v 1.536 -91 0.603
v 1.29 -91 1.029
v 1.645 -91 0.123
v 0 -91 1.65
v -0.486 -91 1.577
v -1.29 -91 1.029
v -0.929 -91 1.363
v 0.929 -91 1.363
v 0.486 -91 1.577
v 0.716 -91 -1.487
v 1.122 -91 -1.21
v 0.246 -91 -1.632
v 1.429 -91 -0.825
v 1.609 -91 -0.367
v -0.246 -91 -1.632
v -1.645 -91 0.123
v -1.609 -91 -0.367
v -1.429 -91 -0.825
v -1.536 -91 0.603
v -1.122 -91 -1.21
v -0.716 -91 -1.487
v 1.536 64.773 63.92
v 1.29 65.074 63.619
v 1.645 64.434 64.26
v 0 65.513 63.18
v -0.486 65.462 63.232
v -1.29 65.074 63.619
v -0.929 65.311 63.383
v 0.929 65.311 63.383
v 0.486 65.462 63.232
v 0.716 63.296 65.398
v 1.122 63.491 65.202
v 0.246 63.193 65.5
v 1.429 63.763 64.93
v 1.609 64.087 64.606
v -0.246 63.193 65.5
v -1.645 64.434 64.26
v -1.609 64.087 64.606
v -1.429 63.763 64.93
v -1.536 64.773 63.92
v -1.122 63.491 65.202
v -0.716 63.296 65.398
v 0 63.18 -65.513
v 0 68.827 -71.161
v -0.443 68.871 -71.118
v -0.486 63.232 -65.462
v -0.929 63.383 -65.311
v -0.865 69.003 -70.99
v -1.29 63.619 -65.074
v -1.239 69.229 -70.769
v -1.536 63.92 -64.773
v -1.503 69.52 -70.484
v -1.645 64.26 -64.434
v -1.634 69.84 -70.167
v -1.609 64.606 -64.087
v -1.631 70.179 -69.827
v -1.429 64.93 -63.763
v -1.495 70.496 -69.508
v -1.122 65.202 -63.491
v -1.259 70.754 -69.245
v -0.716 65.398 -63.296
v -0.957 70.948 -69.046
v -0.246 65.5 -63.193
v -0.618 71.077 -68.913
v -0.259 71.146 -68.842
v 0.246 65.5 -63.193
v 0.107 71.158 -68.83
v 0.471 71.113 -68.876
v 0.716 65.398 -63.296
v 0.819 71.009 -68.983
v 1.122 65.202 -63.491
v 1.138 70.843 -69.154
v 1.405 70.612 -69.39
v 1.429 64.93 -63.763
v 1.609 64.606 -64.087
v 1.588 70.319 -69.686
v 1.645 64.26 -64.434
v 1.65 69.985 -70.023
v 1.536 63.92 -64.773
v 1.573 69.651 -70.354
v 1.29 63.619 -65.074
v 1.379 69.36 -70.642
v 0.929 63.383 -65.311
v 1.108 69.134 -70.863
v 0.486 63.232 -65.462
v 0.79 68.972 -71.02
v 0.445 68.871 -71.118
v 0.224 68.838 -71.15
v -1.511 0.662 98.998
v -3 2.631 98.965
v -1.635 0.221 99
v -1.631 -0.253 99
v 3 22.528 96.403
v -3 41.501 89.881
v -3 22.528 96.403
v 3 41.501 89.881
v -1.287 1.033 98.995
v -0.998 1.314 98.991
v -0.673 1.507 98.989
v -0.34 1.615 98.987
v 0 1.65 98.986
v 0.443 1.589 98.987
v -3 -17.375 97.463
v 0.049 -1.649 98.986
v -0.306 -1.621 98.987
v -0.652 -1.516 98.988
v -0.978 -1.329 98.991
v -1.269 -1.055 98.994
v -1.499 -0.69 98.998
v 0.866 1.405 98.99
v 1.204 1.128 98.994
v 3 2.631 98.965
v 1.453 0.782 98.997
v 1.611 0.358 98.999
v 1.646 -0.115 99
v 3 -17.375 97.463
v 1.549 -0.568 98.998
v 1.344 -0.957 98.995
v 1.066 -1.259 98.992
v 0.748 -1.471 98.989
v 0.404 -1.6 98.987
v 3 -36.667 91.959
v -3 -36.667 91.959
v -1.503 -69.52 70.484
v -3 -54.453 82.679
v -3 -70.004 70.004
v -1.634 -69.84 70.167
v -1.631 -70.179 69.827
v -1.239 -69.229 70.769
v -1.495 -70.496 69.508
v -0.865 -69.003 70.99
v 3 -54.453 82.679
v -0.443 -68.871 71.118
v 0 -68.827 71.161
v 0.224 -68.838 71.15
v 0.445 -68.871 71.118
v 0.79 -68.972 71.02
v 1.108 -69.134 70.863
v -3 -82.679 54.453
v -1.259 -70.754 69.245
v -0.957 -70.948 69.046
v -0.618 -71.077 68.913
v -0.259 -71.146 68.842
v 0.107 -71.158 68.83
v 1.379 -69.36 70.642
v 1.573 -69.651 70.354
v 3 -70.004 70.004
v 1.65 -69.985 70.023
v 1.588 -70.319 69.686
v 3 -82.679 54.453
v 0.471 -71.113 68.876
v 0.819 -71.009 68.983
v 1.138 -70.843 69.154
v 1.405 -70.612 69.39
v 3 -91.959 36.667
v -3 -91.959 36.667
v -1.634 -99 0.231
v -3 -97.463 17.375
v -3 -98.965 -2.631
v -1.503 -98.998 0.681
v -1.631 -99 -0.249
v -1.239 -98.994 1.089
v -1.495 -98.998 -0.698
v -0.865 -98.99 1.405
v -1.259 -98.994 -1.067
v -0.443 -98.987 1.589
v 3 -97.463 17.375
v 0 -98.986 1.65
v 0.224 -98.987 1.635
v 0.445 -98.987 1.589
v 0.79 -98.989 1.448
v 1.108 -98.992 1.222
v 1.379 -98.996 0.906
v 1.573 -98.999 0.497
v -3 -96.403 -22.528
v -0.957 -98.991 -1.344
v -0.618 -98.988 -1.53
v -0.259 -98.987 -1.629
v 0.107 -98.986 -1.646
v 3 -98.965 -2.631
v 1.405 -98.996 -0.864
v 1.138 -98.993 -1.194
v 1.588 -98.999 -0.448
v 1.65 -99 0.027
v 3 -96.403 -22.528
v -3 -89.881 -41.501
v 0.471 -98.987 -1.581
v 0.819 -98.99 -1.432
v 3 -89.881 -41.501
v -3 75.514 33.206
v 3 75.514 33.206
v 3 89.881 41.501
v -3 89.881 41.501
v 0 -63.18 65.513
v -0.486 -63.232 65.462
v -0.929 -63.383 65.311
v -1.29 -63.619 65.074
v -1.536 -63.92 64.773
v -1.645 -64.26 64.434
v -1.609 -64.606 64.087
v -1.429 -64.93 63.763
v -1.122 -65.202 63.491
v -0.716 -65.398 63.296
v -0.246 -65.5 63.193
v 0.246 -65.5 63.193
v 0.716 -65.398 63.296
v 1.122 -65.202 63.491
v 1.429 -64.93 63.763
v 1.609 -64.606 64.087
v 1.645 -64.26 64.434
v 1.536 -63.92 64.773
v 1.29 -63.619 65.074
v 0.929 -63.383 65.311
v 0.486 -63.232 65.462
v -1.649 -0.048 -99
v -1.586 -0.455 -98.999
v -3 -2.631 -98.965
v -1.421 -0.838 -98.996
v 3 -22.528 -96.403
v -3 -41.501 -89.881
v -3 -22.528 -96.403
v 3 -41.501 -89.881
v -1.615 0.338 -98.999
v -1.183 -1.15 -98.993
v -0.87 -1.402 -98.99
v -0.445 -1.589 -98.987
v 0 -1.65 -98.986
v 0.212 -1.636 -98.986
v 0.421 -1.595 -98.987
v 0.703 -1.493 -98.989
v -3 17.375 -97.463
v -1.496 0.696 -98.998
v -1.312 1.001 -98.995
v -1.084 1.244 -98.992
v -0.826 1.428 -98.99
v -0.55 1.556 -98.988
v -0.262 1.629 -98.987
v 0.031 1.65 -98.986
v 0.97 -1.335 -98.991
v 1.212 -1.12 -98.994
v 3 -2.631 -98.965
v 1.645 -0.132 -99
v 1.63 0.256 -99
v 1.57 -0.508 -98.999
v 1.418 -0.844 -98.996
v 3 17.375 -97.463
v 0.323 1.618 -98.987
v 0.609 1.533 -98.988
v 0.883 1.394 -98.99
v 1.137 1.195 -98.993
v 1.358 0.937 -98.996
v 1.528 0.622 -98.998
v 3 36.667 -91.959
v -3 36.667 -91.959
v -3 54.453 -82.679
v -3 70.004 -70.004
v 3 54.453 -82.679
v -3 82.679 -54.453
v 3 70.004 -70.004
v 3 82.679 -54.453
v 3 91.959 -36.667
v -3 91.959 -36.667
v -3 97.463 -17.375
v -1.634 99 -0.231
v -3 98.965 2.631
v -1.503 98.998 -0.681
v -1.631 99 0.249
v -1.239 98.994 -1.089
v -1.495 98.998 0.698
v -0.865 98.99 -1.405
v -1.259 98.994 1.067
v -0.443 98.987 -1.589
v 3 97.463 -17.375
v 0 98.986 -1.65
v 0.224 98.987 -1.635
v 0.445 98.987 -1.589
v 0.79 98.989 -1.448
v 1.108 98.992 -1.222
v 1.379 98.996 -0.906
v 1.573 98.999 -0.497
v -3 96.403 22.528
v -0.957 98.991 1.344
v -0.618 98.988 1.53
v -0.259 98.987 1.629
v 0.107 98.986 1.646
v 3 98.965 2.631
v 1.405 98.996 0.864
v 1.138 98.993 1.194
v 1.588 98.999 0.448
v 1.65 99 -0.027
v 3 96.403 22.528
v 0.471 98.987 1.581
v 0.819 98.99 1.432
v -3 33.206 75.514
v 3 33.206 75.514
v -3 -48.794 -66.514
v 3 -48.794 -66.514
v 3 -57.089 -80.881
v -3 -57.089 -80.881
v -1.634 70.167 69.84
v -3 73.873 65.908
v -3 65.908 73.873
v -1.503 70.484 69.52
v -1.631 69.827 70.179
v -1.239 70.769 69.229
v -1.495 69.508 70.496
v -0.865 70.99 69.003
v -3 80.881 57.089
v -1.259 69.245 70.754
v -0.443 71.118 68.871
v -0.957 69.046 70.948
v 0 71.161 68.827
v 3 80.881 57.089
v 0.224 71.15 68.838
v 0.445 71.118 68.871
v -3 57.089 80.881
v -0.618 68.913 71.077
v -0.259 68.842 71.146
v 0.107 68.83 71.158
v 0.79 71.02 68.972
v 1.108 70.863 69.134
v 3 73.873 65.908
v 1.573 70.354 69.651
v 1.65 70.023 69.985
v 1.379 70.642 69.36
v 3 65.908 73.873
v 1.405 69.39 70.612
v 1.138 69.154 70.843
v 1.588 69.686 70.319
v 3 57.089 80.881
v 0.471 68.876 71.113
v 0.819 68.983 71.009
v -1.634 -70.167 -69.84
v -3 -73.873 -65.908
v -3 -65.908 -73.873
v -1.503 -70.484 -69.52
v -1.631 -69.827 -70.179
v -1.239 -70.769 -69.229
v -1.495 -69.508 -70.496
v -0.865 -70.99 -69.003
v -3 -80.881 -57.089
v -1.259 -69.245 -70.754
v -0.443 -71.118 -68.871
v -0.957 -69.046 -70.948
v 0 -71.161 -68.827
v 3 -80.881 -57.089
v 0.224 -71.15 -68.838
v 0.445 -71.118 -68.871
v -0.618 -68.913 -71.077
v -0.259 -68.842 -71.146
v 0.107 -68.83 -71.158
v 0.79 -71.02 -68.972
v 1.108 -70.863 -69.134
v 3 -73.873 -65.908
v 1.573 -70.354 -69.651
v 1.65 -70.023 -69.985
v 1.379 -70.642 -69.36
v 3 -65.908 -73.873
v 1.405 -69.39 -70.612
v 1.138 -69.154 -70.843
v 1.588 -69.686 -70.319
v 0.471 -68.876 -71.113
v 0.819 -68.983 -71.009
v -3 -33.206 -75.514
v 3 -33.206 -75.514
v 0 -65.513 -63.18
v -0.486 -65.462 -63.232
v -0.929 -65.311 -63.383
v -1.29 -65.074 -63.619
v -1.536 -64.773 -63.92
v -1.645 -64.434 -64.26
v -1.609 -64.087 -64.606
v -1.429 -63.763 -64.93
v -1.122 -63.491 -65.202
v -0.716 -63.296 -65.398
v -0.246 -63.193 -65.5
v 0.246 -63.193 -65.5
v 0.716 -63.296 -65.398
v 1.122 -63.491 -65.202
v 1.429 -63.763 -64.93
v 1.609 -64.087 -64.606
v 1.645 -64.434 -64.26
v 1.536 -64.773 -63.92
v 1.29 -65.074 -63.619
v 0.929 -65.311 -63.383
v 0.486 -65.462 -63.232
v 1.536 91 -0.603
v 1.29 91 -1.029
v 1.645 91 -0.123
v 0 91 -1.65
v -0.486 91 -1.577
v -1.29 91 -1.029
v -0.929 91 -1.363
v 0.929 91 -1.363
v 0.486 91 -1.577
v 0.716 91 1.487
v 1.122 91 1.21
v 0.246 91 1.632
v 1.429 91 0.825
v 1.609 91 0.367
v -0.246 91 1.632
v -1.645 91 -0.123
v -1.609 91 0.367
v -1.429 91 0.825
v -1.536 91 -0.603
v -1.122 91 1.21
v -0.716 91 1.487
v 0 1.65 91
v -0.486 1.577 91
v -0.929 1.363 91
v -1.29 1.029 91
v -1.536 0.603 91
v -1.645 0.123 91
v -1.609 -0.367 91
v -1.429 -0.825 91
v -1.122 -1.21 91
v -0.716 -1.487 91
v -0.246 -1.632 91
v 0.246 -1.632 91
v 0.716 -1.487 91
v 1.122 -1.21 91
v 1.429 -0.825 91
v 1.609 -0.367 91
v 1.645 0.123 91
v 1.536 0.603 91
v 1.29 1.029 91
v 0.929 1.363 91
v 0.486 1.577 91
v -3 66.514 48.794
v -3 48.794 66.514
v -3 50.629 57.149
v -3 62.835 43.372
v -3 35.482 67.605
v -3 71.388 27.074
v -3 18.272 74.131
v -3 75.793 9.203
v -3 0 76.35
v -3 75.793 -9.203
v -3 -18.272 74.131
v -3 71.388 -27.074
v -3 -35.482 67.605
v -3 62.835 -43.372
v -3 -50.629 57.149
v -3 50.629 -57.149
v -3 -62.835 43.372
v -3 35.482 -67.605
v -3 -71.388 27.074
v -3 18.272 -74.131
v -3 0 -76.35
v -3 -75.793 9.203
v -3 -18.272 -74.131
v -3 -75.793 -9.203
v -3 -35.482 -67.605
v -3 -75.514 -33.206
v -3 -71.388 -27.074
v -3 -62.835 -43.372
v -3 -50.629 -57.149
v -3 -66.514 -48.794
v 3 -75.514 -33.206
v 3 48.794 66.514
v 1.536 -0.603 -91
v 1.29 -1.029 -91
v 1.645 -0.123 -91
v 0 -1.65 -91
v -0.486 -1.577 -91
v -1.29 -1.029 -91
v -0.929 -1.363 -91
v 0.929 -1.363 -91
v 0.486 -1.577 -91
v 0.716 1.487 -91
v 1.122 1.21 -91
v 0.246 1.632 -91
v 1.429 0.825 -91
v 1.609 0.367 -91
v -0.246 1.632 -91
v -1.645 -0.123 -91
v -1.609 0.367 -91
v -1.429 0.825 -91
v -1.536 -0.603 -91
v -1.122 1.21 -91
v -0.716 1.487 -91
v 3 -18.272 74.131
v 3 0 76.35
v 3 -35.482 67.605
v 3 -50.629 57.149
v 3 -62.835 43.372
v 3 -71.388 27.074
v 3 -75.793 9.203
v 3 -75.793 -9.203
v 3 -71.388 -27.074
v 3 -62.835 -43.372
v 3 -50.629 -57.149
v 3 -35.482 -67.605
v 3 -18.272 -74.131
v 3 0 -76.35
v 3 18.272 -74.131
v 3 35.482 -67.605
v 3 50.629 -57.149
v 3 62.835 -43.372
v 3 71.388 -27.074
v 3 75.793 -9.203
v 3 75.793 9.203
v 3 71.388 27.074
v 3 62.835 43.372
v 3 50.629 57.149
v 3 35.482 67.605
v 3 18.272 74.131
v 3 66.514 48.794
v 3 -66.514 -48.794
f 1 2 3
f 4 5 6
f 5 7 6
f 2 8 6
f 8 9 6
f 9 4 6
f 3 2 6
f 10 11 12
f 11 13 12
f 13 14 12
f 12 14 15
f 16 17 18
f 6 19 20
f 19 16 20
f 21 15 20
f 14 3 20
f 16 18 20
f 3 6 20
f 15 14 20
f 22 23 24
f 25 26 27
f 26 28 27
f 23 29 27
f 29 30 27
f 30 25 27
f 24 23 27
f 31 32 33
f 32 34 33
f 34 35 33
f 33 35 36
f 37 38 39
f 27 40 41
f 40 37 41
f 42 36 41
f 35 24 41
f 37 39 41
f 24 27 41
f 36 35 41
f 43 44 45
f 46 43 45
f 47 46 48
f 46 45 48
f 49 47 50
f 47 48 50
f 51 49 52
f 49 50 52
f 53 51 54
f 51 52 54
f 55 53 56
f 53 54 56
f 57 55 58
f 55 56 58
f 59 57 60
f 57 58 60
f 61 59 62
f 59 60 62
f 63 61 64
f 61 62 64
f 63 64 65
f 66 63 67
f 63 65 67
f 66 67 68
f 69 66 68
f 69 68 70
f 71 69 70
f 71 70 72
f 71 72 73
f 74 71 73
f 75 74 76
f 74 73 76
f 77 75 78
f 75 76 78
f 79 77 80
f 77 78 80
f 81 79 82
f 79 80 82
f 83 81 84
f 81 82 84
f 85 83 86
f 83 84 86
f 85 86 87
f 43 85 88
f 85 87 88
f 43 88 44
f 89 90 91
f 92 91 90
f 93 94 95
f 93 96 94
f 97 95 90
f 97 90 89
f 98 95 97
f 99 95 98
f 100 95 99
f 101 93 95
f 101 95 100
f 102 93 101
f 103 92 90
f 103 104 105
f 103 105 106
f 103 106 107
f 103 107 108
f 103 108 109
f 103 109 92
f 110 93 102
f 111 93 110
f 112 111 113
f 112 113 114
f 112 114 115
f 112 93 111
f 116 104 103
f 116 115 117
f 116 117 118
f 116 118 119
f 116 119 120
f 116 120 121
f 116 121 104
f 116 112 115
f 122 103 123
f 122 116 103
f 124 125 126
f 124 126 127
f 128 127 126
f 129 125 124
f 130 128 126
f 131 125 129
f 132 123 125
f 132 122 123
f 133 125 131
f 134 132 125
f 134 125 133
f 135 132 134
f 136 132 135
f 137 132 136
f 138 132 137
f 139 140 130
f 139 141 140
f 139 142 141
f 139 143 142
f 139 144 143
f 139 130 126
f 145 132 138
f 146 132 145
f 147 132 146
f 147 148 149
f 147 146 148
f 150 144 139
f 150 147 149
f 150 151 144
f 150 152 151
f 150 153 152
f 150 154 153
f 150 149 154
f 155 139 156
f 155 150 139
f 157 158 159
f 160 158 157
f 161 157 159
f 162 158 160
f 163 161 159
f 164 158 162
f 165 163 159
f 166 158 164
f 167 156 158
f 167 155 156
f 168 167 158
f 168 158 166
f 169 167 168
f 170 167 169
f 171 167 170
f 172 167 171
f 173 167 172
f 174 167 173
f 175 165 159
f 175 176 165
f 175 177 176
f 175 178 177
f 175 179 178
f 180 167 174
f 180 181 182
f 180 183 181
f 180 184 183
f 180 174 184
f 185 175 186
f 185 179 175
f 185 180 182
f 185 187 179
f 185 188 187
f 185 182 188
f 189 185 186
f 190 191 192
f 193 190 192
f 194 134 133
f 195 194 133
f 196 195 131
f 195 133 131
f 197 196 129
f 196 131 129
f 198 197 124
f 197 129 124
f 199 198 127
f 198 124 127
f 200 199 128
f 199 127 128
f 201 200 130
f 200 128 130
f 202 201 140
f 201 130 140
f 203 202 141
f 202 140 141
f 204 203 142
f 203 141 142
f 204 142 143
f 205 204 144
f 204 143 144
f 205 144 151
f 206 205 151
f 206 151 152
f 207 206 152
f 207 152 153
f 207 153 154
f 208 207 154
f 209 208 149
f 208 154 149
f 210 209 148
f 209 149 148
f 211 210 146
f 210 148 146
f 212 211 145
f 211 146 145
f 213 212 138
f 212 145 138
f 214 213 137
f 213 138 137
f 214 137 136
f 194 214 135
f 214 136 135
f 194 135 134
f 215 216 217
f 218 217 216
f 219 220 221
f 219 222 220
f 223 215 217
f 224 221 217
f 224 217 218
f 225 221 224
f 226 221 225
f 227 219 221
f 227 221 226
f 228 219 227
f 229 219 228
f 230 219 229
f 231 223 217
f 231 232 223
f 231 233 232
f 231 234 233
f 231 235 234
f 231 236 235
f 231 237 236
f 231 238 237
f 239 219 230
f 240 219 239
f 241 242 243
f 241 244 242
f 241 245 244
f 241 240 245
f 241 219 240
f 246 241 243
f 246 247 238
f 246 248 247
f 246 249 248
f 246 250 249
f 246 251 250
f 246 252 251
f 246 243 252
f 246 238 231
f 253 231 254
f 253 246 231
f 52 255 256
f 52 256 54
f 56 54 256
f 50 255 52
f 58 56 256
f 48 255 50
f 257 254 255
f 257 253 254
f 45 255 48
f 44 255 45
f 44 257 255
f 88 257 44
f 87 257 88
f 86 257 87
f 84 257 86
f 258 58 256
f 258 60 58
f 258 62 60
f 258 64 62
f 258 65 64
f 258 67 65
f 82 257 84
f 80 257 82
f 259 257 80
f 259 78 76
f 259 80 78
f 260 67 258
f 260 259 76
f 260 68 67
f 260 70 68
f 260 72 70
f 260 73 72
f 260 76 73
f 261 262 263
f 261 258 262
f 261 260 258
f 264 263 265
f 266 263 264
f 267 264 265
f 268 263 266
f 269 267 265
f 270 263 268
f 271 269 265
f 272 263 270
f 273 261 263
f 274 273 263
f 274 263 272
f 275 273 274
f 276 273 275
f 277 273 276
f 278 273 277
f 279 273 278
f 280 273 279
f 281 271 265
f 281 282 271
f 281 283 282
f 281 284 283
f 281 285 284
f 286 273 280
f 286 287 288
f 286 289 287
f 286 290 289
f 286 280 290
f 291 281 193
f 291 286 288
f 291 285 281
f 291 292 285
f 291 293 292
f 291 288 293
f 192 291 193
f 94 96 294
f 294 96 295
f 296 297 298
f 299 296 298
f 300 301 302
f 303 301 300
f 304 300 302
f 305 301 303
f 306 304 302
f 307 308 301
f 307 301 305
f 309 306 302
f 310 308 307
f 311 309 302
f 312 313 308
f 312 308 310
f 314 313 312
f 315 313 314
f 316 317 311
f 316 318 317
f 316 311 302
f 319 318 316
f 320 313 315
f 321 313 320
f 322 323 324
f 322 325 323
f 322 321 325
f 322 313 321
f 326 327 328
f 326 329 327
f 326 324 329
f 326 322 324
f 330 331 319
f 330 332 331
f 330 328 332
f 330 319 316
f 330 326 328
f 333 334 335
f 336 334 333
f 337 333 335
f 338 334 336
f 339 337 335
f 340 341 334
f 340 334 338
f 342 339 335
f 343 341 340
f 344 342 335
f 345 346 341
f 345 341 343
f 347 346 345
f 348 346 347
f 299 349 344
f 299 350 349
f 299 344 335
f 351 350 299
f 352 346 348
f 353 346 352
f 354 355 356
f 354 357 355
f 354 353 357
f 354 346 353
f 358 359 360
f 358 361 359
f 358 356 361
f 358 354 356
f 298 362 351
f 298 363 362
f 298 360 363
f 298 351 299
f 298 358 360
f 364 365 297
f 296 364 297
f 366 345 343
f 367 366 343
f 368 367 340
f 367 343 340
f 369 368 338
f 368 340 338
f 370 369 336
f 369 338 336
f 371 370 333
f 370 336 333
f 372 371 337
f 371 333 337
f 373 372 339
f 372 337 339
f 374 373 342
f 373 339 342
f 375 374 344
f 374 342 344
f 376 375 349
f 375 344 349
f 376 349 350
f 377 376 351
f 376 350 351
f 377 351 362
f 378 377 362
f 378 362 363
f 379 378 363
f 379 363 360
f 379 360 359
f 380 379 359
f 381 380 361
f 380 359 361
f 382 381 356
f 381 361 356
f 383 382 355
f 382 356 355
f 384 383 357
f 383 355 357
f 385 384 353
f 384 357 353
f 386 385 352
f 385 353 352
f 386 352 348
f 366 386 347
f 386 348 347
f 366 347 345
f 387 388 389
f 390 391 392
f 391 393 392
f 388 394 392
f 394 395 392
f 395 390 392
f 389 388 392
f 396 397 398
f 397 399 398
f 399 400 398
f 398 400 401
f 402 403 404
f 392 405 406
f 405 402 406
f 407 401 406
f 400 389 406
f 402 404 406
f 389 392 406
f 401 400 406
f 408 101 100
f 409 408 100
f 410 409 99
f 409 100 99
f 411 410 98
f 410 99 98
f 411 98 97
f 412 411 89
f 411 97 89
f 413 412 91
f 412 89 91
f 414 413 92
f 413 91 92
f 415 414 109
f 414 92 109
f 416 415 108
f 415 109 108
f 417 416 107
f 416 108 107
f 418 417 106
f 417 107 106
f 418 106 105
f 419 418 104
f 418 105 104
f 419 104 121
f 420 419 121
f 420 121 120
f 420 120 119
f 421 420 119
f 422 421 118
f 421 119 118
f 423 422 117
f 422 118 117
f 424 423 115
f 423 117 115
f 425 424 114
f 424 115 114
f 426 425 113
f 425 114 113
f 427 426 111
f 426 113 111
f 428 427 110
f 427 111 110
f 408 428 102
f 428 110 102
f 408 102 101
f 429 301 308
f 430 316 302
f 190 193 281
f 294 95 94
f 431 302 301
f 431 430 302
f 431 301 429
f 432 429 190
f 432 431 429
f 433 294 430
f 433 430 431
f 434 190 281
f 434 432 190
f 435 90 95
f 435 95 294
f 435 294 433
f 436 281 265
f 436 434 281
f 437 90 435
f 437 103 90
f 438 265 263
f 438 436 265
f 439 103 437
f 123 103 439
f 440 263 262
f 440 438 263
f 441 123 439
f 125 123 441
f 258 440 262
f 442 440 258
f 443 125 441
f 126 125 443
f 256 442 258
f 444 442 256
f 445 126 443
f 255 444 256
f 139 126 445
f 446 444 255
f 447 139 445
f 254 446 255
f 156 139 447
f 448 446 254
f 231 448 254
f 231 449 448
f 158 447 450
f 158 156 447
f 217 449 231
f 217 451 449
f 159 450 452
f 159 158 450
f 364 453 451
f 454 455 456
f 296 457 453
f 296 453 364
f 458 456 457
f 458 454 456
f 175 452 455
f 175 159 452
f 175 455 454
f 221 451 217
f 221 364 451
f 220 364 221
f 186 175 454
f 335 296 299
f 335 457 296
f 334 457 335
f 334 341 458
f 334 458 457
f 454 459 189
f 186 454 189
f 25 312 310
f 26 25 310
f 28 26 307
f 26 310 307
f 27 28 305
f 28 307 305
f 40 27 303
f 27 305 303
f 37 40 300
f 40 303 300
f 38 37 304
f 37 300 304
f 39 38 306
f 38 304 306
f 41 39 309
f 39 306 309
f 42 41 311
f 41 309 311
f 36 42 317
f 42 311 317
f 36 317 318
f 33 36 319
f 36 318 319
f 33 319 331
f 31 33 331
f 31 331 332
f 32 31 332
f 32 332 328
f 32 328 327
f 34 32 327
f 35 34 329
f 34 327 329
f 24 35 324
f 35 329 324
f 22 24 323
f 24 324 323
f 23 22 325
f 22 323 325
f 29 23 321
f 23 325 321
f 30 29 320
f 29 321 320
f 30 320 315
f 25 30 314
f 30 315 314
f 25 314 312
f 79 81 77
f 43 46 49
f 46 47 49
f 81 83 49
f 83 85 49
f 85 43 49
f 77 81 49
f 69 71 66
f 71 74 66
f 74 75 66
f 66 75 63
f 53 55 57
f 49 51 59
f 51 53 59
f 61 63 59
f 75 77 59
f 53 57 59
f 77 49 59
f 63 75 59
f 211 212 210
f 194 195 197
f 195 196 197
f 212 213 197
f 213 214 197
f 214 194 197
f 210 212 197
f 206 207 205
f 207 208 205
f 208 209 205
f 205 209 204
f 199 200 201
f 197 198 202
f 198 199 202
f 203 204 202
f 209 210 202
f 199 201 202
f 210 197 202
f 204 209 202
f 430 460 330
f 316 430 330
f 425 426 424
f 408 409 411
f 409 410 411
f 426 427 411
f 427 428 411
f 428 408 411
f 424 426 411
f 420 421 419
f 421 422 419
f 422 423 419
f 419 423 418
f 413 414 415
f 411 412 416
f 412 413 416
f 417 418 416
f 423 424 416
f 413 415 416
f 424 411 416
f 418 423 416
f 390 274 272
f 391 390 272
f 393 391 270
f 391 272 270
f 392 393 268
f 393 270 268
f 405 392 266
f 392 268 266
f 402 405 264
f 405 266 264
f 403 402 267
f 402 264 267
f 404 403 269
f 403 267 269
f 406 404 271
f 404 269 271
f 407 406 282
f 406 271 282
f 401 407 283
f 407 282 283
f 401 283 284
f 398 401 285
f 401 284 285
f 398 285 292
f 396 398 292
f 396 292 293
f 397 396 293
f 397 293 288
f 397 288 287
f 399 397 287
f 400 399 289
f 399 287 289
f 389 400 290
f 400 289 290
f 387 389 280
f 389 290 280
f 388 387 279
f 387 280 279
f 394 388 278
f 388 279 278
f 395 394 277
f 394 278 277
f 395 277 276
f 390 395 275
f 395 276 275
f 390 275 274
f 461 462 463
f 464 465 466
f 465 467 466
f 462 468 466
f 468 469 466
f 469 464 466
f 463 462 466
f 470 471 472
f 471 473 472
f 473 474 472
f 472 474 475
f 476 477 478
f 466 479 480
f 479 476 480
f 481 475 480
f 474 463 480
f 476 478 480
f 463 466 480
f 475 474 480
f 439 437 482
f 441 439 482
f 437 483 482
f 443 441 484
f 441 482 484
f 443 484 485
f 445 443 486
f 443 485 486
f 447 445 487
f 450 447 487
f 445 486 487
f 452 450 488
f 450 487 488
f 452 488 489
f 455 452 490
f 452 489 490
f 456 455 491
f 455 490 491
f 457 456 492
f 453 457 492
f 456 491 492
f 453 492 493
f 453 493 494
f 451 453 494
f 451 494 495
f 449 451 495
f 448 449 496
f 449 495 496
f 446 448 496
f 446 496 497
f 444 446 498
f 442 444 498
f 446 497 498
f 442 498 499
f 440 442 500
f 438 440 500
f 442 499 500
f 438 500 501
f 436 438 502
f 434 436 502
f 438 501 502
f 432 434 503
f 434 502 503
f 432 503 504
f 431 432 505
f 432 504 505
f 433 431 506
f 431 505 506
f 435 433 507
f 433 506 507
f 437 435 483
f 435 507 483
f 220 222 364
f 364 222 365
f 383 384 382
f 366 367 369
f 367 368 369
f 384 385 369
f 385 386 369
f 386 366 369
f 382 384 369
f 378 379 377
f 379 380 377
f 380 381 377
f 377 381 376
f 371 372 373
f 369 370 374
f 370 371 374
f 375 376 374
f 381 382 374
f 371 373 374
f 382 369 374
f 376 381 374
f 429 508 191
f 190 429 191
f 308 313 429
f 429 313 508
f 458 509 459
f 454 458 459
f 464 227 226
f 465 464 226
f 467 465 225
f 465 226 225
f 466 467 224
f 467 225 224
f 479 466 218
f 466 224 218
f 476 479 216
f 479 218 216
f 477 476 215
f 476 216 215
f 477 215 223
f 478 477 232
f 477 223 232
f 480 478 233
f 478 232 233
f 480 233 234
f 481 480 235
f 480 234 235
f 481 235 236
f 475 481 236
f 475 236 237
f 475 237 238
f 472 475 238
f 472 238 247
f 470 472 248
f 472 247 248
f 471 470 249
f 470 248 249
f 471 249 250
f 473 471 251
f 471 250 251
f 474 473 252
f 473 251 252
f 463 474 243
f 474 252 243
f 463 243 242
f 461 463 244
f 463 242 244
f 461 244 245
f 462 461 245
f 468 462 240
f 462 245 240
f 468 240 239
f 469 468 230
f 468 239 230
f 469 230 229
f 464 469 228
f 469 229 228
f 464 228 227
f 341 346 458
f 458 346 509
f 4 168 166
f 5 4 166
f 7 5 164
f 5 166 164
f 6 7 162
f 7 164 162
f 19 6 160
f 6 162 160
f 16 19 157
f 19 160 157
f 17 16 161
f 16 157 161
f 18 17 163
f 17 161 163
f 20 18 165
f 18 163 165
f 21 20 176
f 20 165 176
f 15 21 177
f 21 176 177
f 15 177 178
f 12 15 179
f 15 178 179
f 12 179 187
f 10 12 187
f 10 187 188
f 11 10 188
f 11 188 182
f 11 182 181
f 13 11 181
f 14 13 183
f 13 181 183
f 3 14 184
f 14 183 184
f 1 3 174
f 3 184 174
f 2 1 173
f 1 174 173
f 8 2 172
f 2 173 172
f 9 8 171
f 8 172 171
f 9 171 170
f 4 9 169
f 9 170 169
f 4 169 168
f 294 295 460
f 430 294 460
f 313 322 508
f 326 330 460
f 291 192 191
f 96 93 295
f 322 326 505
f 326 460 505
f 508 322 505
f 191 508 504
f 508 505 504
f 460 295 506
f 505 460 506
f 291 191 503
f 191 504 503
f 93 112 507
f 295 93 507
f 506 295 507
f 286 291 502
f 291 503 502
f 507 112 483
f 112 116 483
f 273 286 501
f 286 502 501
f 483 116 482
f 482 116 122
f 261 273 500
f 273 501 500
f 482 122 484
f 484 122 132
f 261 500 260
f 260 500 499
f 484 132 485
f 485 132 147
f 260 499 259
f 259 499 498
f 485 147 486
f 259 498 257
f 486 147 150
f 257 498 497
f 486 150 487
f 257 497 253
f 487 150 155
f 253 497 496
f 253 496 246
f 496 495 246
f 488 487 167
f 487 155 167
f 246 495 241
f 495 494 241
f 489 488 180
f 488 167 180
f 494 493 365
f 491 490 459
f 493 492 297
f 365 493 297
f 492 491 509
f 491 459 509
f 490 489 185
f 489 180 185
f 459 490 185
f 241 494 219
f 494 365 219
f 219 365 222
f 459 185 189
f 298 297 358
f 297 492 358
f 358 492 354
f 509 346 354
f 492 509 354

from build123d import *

# Parameters (mm, degrees)
RING_SKETCH_W        = 6
RING_SKETCH_H        = 22.65
NOTCH_30_DEPTH       = 6
NOTCH_60_DEPTH       = 6
NOTCH_210_DEPTH      = 6
NOTCH_240_DEPTH      = 6
SCREW_HOLE_SKETCH_W  = 1.65
SCREW_HOLE_SKETCH_H  = 9
SCREW_HOLES_X8_COUNT = 8


with BuildPart() as part:
    # Ring Sketch → Ring (revolve)
    with BuildSketch(Plane.XY):
        with Locations((0, 87.675)):
            Rectangle(RING_SKETCH_W, RING_SKETCH_H)
    revolve(axis=Axis((-1000, 0, 0), (1, 0, 0)))

    # Notch 30 Sketch → Notch 30 (cut)
    with BuildSketch(Plane(origin=(3, 0, 0), x_dir=(0, 0, -1), z_dir=(1, 0, 0))):
        Polygon((-48.794228634, 66.51408311), (-33.205771366, 75.51408311), (-42.705771366, 91.968565782), (-58.294228634, 82.968565782), align=None)
    extrude(amount=-NOTCH_30_DEPTH, mode=Mode.SUBTRACT)

    # Notch 60 Sketch → Notch 60 (cut)
    with BuildSketch(Plane(origin=(3, 0, 0), x_dir=(0, 0, -1), z_dir=(1, 0, 0))):
        Polygon((-75.51408311, 33.205771366), (-66.51408311, 48.794228634), (-82.968565782, 58.294228634), (-91.968565782, 42.705771366), align=None)
    extrude(amount=-NOTCH_60_DEPTH, mode=Mode.SUBTRACT)

    # Notch 210 Sketch → Notch 210 (cut)
    with BuildSketch(Plane(origin=(3, 0, 0), x_dir=(0, 0, -1), z_dir=(1, 0, 0))):
        Polygon((48.794228634, -66.51408311), (33.205771366, -75.51408311), (42.705771366, -91.968565782), (58.294228634, -82.968565782), align=None)
    extrude(amount=-NOTCH_210_DEPTH, mode=Mode.SUBTRACT)

    # Notch 240 Sketch → Notch 240 (cut)
    with BuildSketch(Plane(origin=(3, 0, 0), x_dir=(0, 0, -1), z_dir=(1, 0, 0))):
        Polygon((75.51408311, -33.205771366), (66.51408311, -48.794228634), (82.968565782, -58.294228634), (91.968565782, -42.705771366), align=None)
    extrude(amount=-NOTCH_240_DEPTH, mode=Mode.SUBTRACT)

    # Screw Hole Sketch → Screw Hole (revolve, cut)
    with BuildSketch(Plane.XY):
        with Locations((0.825, 95.5)):
            Rectangle(SCREW_HOLE_SKETCH_W, SCREW_HOLE_SKETCH_H)
    screw_hole = revolve(axis=Axis((0, 30, 0), (0, 1, 0)), mode=Mode.SUBTRACT)

    # Screw Holes x8: Screw Hole ×8 about axis
    screw_holes_x8_axis = Axis((3.3, 0, 0), (-1, 0, 0))
    for i in range(1, SCREW_HOLES_X8_COUNT):
        add(screw_hole.rotate(screw_holes_x8_axis, i * 360 / SCREW_HOLES_X8_COUNT), mode=Mode.SUBTRACT)


solid = part.part
